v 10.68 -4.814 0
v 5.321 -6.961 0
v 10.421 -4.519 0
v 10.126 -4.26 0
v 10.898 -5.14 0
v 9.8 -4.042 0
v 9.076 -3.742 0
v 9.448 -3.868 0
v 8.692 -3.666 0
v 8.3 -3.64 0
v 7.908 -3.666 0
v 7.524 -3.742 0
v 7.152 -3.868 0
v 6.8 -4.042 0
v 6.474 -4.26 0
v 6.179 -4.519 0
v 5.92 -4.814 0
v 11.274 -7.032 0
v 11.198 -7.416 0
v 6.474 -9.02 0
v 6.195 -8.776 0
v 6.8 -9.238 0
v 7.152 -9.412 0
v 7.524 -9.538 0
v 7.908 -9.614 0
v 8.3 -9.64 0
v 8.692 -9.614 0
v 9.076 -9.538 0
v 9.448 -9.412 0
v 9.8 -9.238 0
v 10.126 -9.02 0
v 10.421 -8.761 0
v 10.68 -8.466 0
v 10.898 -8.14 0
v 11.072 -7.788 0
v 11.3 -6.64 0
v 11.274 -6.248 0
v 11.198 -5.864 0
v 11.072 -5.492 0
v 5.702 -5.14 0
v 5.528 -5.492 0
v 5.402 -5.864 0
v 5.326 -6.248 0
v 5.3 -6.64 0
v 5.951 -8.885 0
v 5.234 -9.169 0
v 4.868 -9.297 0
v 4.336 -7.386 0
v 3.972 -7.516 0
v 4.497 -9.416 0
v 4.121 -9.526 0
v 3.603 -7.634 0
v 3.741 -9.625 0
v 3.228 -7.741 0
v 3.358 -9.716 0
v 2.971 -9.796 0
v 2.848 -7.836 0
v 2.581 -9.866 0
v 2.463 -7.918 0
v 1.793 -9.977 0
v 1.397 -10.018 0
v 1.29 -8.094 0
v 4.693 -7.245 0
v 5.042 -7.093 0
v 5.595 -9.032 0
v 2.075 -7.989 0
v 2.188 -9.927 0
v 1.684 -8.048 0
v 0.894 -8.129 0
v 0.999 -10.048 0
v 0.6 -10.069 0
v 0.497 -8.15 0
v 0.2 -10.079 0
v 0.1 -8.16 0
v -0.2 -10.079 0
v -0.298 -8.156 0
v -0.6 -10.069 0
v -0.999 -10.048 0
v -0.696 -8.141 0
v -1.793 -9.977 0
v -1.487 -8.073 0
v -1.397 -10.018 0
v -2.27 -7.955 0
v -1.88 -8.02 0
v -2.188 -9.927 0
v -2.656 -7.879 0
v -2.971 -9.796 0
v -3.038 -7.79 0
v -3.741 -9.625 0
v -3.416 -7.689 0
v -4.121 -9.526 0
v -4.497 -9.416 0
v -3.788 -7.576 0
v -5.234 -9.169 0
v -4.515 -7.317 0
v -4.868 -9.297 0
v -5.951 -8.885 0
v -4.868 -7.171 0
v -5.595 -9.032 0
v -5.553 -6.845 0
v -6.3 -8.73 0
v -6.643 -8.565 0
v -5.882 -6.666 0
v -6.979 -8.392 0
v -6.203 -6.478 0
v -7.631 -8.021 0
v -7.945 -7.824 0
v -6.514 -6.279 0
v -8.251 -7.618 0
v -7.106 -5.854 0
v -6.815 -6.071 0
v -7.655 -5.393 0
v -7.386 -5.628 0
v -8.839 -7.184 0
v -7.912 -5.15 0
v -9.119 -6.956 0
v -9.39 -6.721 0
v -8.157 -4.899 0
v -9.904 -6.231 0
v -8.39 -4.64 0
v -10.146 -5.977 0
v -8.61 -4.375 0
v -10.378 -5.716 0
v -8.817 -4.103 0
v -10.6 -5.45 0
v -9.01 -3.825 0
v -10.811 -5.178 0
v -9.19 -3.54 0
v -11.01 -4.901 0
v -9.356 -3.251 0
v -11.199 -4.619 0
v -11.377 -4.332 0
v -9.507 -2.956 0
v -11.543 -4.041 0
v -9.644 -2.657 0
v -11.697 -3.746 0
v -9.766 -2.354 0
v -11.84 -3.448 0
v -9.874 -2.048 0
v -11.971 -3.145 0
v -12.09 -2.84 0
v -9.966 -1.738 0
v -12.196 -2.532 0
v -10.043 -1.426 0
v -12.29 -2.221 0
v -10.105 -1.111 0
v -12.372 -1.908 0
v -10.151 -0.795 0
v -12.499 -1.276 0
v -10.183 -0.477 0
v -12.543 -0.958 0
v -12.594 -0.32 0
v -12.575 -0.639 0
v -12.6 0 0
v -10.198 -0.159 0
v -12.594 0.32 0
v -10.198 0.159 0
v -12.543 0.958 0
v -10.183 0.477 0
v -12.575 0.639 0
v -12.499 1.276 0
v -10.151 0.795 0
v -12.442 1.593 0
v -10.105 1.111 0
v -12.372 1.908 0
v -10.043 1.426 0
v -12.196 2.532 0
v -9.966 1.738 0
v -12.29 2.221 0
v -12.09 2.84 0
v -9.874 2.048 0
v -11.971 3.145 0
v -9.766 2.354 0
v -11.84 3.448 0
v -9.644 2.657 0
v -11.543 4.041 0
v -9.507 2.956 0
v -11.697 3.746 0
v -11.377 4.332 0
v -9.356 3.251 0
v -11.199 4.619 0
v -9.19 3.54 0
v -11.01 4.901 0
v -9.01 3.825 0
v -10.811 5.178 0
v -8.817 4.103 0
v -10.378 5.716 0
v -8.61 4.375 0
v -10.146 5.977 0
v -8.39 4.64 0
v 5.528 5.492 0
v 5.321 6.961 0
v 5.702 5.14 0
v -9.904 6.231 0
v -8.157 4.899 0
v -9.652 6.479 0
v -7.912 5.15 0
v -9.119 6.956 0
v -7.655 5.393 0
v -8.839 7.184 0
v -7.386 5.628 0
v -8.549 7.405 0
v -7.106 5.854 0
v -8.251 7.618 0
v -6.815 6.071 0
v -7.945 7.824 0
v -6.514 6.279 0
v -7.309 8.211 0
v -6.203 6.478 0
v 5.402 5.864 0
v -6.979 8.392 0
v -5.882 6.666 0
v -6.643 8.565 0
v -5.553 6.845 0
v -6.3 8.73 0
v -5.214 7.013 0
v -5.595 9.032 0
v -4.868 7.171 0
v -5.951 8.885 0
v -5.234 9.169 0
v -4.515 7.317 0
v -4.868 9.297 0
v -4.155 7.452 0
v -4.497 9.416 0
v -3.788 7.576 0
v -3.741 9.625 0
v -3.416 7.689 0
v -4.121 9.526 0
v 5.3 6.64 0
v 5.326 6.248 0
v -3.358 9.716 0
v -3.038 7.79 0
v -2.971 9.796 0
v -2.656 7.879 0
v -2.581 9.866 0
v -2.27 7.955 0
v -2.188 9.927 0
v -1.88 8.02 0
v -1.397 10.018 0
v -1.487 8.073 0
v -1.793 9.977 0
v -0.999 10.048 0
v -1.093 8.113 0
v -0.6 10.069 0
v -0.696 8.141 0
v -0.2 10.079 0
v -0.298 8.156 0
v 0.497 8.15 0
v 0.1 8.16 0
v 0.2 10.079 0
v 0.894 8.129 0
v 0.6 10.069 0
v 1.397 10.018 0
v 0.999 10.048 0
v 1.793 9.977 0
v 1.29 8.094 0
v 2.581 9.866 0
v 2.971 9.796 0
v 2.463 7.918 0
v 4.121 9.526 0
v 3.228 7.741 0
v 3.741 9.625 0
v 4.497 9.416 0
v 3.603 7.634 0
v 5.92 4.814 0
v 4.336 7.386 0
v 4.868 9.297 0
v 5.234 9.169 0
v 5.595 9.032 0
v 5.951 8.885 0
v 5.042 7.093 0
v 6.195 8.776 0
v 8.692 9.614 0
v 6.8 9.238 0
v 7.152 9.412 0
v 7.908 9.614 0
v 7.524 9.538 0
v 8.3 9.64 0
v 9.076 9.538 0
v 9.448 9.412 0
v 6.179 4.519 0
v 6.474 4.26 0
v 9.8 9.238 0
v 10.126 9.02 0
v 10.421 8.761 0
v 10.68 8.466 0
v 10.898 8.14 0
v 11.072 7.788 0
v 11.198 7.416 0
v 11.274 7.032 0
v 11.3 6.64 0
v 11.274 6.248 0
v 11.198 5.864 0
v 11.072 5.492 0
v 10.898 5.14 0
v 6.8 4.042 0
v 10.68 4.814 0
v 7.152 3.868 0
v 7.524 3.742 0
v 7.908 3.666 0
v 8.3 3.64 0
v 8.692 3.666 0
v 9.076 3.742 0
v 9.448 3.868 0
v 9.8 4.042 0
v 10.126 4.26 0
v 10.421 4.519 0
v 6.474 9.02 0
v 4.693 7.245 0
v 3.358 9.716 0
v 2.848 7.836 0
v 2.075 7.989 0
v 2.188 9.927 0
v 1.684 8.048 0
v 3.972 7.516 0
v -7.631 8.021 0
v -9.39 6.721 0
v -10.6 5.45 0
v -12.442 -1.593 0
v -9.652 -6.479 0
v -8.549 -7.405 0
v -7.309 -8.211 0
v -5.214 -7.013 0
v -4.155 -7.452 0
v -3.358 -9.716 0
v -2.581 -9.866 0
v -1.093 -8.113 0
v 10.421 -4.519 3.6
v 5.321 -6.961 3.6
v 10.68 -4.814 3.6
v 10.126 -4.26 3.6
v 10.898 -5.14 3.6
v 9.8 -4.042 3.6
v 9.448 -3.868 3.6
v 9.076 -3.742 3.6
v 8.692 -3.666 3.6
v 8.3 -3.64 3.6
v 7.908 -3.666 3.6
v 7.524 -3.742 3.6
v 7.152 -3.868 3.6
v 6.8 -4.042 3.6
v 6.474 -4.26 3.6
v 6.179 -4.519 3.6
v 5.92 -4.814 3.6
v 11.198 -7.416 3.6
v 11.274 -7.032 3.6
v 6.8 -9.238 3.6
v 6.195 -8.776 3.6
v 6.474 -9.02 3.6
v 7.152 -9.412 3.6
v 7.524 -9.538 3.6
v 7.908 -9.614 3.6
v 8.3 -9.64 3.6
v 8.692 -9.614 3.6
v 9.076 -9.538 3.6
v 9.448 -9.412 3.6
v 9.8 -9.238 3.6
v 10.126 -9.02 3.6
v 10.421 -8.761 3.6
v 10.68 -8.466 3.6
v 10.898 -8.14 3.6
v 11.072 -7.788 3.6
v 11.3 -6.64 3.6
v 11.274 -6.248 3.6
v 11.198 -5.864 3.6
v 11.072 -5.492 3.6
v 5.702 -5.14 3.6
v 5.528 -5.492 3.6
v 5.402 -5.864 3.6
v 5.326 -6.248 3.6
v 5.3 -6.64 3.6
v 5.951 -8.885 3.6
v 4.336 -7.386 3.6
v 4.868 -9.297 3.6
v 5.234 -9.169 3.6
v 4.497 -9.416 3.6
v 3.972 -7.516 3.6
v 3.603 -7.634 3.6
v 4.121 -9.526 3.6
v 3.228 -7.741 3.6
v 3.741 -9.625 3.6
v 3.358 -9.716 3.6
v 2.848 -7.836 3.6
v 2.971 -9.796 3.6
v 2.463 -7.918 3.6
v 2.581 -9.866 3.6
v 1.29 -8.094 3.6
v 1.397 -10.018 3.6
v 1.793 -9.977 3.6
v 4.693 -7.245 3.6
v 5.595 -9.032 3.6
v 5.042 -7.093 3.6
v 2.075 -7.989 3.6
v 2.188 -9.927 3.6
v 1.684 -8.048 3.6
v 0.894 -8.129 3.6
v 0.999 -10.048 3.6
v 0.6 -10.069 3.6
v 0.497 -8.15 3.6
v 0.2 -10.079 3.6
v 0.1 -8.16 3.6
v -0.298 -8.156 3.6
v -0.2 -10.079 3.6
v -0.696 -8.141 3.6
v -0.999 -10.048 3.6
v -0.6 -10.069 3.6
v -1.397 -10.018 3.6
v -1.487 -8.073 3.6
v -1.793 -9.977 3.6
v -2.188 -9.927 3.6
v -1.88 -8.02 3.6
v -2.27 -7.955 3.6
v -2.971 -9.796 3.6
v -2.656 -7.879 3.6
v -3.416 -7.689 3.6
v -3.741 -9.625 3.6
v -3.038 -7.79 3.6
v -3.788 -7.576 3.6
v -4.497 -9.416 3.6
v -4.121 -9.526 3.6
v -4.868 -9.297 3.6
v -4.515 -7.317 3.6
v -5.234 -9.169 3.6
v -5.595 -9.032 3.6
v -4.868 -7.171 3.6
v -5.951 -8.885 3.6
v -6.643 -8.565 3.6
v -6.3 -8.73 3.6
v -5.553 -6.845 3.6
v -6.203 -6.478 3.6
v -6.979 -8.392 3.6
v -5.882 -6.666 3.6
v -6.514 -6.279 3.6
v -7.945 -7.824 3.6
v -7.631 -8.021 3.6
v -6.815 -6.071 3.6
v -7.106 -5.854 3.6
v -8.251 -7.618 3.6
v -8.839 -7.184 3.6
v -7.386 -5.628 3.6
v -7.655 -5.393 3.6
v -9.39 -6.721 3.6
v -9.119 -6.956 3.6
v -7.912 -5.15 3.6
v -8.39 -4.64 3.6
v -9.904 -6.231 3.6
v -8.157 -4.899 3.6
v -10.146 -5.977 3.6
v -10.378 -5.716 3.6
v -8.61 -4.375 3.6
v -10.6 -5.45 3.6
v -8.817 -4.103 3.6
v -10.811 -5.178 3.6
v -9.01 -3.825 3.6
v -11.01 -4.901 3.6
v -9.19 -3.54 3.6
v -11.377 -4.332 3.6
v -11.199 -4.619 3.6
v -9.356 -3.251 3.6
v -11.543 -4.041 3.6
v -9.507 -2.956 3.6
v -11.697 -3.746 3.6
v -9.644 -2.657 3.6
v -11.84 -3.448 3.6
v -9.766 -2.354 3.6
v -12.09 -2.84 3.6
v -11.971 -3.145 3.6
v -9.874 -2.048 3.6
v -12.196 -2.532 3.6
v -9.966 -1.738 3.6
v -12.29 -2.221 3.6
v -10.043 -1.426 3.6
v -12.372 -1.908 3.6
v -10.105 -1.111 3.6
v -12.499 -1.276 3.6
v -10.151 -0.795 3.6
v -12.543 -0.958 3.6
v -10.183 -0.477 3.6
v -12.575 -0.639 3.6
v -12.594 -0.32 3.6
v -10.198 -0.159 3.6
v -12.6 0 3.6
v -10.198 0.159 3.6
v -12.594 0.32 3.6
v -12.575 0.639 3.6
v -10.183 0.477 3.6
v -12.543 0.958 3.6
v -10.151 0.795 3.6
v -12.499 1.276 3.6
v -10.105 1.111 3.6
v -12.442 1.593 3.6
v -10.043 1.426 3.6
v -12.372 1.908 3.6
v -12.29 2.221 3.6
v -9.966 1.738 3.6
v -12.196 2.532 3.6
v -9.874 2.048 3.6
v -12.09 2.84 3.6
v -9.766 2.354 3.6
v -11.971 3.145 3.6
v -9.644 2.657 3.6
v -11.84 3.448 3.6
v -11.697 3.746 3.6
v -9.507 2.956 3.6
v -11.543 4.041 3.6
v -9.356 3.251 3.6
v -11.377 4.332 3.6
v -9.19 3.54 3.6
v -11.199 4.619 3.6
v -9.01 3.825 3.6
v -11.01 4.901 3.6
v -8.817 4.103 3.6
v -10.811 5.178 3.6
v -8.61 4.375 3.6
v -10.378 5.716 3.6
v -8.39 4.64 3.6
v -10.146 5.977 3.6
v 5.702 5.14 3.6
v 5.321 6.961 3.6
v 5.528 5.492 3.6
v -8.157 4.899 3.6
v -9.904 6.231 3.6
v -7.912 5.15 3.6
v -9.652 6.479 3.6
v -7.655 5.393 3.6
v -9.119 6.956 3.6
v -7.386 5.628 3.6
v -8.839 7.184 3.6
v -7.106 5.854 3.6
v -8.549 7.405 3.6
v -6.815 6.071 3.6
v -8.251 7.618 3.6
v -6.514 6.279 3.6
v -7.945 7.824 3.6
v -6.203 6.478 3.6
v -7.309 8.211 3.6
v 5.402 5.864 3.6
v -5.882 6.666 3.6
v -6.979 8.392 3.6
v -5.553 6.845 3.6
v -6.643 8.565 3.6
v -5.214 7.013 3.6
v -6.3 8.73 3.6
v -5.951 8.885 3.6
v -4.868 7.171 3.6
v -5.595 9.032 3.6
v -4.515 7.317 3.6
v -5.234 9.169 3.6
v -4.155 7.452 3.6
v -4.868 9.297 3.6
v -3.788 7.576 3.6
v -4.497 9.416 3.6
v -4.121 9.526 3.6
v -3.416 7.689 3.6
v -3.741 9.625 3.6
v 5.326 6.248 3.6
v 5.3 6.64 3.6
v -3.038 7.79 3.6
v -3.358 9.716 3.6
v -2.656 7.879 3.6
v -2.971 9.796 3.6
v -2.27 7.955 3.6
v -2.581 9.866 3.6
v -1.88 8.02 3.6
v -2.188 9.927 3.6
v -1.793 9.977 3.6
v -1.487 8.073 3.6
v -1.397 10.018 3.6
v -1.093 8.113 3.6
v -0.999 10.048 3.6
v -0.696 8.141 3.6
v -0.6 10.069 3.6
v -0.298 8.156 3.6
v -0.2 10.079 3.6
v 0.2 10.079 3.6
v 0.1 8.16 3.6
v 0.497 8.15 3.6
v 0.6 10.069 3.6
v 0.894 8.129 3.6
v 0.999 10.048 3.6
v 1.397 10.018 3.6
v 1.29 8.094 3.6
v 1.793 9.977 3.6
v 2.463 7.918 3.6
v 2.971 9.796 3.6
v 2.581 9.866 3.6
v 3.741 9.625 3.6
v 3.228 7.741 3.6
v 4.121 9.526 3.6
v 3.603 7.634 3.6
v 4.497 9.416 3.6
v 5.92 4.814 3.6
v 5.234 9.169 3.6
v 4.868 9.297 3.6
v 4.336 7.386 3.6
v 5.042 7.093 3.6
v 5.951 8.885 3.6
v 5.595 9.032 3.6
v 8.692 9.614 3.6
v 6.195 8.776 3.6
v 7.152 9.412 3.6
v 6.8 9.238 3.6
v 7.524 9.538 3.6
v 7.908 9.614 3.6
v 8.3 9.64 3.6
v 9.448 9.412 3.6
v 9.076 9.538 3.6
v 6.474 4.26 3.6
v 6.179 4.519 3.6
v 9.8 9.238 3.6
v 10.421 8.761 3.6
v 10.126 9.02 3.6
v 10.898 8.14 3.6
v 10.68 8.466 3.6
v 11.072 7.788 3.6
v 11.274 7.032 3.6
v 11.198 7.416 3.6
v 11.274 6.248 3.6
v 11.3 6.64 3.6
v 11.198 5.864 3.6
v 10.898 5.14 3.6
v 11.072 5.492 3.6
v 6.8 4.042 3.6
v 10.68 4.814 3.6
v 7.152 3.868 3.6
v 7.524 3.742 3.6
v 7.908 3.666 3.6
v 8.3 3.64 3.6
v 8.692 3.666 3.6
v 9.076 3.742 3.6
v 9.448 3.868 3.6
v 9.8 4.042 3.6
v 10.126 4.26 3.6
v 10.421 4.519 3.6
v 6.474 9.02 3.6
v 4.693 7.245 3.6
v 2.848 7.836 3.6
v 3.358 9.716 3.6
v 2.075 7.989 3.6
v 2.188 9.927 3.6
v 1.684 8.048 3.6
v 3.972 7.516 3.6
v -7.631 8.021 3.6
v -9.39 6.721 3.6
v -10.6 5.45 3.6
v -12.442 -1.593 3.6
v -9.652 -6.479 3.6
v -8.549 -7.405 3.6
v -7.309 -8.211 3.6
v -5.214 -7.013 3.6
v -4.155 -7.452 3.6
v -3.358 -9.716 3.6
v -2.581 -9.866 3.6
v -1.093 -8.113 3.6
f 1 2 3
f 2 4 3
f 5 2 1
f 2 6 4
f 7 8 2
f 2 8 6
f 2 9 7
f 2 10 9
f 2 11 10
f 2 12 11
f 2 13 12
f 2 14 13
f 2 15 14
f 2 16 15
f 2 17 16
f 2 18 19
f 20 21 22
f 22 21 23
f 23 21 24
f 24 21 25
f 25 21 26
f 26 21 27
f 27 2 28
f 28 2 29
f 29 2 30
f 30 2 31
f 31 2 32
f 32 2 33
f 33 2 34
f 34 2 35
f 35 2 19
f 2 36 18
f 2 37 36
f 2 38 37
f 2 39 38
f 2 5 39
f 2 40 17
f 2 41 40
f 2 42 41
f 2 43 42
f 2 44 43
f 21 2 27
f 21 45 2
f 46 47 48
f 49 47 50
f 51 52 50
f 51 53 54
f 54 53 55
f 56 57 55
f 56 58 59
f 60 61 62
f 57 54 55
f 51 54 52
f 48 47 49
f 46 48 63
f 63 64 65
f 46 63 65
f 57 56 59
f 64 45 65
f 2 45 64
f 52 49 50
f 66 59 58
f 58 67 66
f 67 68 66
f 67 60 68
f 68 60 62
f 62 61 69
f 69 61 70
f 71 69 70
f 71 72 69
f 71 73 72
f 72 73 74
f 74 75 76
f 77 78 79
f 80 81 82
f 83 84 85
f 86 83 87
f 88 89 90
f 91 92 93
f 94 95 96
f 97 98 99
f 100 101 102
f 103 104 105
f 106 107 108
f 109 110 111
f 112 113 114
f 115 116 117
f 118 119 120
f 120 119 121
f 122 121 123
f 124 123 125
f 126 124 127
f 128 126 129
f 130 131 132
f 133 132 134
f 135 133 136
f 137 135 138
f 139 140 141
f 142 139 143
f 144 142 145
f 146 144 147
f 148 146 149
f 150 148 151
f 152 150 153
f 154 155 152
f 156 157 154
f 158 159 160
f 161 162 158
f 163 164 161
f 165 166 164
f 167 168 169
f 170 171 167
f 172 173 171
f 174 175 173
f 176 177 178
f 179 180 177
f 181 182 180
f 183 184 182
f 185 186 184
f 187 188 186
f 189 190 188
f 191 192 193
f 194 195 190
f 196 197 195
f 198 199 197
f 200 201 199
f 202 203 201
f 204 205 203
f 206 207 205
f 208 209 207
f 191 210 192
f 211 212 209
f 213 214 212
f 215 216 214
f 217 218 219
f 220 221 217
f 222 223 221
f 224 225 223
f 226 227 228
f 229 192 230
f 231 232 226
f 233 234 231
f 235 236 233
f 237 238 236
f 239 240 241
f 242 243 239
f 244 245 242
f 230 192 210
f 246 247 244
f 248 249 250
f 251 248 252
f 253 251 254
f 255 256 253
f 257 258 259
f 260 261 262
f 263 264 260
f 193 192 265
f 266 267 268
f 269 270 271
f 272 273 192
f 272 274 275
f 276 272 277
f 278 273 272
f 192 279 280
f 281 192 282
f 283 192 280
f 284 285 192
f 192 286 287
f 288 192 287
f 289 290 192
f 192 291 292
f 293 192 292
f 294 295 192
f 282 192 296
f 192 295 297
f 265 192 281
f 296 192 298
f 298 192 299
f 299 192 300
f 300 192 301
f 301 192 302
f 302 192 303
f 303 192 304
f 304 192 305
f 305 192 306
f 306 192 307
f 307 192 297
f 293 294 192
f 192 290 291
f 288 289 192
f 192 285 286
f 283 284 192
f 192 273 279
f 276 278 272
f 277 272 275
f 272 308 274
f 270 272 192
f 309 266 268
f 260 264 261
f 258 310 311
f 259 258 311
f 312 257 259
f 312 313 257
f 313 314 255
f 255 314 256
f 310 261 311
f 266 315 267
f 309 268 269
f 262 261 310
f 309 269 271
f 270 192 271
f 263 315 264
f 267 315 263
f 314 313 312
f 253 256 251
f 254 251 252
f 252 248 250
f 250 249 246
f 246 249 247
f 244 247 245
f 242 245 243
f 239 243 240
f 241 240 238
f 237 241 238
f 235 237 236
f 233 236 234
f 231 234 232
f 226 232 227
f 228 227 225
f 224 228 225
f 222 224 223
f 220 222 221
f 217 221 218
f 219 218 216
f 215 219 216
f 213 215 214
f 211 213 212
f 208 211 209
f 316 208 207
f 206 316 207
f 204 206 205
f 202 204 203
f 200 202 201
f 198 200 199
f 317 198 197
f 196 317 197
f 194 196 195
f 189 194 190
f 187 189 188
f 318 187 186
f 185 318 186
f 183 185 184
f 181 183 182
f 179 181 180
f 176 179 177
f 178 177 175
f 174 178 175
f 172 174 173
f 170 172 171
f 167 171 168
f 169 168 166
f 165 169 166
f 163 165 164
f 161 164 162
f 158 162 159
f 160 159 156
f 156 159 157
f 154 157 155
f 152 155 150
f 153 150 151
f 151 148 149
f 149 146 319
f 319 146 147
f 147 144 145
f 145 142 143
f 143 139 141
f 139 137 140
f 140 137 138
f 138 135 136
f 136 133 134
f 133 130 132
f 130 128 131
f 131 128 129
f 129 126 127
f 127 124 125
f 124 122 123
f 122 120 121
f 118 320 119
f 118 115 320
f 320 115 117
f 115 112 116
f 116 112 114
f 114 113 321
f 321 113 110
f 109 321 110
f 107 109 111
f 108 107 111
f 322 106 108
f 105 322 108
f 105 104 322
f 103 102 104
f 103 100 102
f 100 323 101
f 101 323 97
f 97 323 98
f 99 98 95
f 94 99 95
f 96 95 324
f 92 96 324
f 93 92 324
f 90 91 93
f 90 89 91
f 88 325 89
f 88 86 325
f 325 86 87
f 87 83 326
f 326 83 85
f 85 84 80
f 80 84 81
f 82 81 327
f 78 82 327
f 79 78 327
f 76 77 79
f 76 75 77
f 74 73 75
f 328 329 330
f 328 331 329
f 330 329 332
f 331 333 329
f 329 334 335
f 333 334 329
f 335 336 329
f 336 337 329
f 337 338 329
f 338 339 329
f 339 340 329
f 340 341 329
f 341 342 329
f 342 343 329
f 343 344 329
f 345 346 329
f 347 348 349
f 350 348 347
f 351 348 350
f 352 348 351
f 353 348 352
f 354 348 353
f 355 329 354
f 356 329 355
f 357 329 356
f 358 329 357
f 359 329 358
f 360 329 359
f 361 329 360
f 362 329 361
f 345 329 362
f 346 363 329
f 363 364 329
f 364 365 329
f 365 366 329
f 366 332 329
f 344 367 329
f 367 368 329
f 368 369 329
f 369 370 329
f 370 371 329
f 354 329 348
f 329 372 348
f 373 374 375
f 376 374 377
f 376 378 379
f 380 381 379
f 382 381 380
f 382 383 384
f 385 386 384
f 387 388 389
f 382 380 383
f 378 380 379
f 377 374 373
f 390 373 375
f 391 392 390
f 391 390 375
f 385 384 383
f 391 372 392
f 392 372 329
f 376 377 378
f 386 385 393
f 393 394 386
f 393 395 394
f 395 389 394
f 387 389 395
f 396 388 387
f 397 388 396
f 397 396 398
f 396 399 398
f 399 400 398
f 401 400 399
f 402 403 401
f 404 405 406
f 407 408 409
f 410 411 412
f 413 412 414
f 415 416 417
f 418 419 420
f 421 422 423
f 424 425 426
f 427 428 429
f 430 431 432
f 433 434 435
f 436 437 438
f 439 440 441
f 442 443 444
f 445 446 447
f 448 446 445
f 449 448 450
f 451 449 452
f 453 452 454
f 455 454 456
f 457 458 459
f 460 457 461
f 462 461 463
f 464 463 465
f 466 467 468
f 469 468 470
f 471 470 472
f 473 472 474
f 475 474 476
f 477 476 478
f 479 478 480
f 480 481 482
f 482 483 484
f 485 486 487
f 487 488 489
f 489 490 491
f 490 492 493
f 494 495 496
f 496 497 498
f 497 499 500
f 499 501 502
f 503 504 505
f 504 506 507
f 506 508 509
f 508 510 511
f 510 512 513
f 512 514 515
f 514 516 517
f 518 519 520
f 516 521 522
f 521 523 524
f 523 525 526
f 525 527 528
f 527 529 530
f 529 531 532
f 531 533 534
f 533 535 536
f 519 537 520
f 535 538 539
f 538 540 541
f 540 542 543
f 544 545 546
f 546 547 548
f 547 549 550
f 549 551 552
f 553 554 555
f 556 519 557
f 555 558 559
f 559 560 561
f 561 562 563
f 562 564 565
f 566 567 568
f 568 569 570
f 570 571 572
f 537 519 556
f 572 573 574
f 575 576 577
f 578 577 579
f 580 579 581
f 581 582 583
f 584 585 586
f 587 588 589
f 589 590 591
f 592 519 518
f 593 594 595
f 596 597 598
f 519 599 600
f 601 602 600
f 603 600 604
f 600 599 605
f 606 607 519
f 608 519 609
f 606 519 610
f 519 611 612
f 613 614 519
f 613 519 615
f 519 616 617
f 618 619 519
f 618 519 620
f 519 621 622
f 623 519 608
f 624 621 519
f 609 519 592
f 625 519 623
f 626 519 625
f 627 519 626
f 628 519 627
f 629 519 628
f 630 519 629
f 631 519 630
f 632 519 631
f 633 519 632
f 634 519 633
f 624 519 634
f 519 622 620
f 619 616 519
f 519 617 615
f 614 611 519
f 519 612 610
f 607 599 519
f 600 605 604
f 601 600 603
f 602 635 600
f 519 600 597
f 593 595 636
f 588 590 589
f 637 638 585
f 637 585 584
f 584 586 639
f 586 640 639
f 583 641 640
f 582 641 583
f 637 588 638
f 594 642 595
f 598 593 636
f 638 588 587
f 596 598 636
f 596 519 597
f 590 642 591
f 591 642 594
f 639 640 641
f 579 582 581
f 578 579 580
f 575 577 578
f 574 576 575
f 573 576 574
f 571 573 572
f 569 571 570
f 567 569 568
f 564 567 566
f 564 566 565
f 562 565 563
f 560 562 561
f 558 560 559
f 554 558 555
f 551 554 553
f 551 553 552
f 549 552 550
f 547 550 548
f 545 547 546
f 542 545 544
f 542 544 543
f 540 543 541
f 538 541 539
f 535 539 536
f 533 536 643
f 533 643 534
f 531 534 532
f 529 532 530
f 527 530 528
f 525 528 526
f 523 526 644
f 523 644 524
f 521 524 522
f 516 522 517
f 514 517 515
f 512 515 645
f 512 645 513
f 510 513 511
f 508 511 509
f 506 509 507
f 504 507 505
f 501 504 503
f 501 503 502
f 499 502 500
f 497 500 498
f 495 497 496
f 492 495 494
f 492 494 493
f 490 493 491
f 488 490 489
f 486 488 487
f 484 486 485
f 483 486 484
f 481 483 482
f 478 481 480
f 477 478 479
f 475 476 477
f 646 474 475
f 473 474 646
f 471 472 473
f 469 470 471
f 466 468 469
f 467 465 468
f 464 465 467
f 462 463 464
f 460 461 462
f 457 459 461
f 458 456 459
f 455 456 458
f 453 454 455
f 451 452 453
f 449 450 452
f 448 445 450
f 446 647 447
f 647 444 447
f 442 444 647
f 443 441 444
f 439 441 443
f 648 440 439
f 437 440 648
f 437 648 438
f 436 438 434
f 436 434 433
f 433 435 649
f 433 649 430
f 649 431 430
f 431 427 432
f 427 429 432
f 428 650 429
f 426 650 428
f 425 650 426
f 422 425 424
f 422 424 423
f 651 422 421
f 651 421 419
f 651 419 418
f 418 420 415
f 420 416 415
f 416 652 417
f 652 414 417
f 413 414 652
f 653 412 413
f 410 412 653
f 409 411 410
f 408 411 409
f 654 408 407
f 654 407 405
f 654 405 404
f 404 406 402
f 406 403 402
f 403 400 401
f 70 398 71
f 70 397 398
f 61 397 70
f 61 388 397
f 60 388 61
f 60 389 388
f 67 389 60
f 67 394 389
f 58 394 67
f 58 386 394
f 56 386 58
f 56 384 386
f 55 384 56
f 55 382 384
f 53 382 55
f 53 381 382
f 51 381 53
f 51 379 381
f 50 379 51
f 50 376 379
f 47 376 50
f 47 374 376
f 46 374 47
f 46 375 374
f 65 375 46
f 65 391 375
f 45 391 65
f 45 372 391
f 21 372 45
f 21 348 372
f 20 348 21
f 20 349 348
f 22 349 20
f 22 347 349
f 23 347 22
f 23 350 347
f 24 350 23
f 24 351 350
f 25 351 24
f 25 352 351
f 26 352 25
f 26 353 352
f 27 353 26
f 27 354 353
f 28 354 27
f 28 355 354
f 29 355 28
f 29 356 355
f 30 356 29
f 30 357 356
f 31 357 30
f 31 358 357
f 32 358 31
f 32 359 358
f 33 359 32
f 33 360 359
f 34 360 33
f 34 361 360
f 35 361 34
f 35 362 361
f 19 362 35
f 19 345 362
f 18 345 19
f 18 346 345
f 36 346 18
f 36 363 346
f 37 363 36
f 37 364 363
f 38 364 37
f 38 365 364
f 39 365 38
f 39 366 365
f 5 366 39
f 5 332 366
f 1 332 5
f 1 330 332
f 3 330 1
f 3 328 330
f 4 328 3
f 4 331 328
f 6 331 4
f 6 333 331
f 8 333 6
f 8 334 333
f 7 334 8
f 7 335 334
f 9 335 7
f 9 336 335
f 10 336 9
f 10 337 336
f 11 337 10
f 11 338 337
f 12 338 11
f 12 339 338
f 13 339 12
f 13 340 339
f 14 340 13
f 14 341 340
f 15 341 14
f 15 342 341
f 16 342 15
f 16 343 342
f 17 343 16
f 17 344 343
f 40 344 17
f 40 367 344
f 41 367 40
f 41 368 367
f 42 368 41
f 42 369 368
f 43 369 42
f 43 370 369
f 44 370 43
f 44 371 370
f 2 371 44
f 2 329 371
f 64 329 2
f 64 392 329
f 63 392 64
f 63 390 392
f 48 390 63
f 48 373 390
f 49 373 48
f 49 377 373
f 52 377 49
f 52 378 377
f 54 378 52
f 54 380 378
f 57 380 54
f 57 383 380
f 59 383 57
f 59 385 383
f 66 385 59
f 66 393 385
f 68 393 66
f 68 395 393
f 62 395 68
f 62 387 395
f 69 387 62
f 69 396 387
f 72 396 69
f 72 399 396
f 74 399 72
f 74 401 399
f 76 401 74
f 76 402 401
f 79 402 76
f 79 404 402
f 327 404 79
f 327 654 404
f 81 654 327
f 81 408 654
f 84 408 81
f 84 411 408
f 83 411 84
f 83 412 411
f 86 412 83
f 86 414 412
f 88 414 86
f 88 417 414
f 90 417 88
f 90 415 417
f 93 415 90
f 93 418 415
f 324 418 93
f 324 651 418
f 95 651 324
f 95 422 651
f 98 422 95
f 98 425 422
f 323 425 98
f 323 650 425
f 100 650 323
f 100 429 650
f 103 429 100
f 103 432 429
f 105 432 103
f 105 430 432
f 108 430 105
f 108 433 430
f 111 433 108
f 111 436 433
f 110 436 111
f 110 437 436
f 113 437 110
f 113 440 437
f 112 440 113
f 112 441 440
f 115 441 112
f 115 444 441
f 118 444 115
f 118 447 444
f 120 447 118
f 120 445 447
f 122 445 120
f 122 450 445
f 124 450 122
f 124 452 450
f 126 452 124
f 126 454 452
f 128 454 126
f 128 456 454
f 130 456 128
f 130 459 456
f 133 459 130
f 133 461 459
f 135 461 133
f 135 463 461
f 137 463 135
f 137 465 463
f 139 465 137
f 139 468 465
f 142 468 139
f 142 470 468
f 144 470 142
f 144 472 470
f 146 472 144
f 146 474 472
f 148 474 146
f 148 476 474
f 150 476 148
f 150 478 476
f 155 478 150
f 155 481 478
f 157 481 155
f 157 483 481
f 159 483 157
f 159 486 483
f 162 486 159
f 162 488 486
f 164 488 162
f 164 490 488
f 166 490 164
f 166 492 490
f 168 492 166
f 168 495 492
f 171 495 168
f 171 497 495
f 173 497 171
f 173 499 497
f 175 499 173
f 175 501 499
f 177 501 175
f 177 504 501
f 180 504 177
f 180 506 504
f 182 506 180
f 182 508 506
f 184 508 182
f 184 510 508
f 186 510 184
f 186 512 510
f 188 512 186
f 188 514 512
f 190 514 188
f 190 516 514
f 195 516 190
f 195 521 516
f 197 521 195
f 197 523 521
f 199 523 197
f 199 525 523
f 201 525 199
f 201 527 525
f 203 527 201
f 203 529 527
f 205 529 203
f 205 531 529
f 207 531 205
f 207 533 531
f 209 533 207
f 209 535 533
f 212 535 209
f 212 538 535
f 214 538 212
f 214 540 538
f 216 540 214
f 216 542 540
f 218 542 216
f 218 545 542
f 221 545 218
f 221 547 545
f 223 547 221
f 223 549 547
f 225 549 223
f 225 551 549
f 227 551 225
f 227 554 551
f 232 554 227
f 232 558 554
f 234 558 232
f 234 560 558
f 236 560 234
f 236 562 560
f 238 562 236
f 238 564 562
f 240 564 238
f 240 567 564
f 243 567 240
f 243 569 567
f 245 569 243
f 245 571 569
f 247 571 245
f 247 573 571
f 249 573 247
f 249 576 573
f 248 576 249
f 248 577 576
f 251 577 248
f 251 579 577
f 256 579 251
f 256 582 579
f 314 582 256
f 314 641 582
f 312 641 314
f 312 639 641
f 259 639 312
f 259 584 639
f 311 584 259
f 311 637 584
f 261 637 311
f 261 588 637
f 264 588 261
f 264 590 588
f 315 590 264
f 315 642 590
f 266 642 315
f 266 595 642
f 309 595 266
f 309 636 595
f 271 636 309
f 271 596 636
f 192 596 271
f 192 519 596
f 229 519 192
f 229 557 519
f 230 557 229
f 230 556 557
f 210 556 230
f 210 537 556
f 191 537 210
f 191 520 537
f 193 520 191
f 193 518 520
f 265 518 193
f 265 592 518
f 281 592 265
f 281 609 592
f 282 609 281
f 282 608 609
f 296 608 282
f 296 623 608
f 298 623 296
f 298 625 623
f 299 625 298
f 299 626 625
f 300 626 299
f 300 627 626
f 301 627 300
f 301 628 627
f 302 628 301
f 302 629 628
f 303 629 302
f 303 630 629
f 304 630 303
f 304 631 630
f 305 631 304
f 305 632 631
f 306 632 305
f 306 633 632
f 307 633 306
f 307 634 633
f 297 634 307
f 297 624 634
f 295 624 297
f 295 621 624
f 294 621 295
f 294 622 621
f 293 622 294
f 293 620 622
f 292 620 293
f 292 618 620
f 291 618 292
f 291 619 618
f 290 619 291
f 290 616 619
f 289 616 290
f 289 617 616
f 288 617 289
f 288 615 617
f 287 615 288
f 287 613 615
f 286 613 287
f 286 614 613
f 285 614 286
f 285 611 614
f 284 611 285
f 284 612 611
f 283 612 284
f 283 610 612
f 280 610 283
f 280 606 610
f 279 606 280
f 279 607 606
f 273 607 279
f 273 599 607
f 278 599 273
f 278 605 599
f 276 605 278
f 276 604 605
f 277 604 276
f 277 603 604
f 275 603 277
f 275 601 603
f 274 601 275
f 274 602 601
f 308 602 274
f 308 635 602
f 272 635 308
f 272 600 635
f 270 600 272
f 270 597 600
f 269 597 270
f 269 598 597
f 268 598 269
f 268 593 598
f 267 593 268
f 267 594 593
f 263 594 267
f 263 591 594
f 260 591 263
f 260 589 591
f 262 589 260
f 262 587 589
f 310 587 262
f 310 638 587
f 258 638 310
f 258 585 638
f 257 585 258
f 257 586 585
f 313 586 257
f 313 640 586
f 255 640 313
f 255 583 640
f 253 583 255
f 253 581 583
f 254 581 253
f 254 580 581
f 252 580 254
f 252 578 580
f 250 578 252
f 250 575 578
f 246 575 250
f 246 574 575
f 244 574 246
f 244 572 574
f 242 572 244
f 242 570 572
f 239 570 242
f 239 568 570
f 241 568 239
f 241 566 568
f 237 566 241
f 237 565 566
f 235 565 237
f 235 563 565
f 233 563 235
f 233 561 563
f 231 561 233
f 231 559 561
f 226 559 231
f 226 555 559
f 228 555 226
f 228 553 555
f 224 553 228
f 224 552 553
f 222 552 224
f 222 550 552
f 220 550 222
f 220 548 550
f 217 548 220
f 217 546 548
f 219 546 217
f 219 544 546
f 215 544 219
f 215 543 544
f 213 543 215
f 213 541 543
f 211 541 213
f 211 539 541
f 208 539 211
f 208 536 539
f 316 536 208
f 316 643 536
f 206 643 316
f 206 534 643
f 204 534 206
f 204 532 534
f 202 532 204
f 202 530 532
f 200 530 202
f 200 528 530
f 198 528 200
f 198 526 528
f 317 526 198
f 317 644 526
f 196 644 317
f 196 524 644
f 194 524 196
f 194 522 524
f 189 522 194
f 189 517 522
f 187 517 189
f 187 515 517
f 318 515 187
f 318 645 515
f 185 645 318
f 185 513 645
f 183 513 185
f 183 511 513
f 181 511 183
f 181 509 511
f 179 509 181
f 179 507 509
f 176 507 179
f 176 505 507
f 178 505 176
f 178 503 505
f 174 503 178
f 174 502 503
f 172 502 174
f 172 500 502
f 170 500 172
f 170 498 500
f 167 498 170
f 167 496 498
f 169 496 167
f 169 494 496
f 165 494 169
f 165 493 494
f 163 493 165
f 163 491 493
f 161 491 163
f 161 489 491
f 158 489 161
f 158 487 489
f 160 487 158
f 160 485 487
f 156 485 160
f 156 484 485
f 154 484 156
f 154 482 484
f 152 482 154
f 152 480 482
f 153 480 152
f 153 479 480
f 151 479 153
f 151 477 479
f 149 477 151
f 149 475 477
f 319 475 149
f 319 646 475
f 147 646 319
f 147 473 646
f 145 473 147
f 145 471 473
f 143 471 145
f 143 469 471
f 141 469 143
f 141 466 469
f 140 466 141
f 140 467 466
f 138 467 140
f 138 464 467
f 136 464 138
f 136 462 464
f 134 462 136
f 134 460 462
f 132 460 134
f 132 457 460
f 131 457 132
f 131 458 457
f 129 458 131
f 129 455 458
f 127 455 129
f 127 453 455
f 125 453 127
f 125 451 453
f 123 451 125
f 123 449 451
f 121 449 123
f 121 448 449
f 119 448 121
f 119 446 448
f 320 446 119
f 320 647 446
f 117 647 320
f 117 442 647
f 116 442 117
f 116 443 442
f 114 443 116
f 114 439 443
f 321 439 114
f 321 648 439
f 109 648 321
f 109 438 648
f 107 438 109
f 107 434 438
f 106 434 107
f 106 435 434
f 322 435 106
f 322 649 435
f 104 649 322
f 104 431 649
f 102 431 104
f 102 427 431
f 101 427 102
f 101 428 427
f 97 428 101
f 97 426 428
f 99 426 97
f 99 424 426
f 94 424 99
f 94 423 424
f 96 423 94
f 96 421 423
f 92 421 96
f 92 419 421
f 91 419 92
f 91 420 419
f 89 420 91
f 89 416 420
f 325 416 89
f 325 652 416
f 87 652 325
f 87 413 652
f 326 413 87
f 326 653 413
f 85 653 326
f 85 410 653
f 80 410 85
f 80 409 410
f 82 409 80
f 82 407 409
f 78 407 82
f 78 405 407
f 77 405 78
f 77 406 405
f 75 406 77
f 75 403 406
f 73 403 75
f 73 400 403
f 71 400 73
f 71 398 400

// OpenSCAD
$fa = 1; // minimum angle
$fs = 0.4; // minimum size
z_layer = 0.24; // layer thickness
z_plate = 14.6; // plate height without lid
z_off = 2; // offset for lid

s_x = 1; // scale factors for main circle body
s_y = 0.8;

linear_extrude(z_layer*15)
union() {
    difference() {
        s_body = [s_x,s_y,1]; // scale factor for main body
        scale(s_body) circle(r = z_plate-z_off);
        scale(s_body) circle(r = z_plate-z_off*2.2);

        translate([z_plate-1,0,0])
        square(z_plate, center = true); // plate
    }

    // grippers
    d_grip = 6;
    off_grip_x = -(z_plate/2+z_off/2)*s_x; // gripper offset from center
    off_grip_y = -(z_plate/2+z_off/2)*s_y;

    translate([-off_grip_x,off_grip_y,0])
    circle(d = d_grip);
    translate([-off_grip_x,-off_grip_y,0])
    circle(d = d_grip);
}
